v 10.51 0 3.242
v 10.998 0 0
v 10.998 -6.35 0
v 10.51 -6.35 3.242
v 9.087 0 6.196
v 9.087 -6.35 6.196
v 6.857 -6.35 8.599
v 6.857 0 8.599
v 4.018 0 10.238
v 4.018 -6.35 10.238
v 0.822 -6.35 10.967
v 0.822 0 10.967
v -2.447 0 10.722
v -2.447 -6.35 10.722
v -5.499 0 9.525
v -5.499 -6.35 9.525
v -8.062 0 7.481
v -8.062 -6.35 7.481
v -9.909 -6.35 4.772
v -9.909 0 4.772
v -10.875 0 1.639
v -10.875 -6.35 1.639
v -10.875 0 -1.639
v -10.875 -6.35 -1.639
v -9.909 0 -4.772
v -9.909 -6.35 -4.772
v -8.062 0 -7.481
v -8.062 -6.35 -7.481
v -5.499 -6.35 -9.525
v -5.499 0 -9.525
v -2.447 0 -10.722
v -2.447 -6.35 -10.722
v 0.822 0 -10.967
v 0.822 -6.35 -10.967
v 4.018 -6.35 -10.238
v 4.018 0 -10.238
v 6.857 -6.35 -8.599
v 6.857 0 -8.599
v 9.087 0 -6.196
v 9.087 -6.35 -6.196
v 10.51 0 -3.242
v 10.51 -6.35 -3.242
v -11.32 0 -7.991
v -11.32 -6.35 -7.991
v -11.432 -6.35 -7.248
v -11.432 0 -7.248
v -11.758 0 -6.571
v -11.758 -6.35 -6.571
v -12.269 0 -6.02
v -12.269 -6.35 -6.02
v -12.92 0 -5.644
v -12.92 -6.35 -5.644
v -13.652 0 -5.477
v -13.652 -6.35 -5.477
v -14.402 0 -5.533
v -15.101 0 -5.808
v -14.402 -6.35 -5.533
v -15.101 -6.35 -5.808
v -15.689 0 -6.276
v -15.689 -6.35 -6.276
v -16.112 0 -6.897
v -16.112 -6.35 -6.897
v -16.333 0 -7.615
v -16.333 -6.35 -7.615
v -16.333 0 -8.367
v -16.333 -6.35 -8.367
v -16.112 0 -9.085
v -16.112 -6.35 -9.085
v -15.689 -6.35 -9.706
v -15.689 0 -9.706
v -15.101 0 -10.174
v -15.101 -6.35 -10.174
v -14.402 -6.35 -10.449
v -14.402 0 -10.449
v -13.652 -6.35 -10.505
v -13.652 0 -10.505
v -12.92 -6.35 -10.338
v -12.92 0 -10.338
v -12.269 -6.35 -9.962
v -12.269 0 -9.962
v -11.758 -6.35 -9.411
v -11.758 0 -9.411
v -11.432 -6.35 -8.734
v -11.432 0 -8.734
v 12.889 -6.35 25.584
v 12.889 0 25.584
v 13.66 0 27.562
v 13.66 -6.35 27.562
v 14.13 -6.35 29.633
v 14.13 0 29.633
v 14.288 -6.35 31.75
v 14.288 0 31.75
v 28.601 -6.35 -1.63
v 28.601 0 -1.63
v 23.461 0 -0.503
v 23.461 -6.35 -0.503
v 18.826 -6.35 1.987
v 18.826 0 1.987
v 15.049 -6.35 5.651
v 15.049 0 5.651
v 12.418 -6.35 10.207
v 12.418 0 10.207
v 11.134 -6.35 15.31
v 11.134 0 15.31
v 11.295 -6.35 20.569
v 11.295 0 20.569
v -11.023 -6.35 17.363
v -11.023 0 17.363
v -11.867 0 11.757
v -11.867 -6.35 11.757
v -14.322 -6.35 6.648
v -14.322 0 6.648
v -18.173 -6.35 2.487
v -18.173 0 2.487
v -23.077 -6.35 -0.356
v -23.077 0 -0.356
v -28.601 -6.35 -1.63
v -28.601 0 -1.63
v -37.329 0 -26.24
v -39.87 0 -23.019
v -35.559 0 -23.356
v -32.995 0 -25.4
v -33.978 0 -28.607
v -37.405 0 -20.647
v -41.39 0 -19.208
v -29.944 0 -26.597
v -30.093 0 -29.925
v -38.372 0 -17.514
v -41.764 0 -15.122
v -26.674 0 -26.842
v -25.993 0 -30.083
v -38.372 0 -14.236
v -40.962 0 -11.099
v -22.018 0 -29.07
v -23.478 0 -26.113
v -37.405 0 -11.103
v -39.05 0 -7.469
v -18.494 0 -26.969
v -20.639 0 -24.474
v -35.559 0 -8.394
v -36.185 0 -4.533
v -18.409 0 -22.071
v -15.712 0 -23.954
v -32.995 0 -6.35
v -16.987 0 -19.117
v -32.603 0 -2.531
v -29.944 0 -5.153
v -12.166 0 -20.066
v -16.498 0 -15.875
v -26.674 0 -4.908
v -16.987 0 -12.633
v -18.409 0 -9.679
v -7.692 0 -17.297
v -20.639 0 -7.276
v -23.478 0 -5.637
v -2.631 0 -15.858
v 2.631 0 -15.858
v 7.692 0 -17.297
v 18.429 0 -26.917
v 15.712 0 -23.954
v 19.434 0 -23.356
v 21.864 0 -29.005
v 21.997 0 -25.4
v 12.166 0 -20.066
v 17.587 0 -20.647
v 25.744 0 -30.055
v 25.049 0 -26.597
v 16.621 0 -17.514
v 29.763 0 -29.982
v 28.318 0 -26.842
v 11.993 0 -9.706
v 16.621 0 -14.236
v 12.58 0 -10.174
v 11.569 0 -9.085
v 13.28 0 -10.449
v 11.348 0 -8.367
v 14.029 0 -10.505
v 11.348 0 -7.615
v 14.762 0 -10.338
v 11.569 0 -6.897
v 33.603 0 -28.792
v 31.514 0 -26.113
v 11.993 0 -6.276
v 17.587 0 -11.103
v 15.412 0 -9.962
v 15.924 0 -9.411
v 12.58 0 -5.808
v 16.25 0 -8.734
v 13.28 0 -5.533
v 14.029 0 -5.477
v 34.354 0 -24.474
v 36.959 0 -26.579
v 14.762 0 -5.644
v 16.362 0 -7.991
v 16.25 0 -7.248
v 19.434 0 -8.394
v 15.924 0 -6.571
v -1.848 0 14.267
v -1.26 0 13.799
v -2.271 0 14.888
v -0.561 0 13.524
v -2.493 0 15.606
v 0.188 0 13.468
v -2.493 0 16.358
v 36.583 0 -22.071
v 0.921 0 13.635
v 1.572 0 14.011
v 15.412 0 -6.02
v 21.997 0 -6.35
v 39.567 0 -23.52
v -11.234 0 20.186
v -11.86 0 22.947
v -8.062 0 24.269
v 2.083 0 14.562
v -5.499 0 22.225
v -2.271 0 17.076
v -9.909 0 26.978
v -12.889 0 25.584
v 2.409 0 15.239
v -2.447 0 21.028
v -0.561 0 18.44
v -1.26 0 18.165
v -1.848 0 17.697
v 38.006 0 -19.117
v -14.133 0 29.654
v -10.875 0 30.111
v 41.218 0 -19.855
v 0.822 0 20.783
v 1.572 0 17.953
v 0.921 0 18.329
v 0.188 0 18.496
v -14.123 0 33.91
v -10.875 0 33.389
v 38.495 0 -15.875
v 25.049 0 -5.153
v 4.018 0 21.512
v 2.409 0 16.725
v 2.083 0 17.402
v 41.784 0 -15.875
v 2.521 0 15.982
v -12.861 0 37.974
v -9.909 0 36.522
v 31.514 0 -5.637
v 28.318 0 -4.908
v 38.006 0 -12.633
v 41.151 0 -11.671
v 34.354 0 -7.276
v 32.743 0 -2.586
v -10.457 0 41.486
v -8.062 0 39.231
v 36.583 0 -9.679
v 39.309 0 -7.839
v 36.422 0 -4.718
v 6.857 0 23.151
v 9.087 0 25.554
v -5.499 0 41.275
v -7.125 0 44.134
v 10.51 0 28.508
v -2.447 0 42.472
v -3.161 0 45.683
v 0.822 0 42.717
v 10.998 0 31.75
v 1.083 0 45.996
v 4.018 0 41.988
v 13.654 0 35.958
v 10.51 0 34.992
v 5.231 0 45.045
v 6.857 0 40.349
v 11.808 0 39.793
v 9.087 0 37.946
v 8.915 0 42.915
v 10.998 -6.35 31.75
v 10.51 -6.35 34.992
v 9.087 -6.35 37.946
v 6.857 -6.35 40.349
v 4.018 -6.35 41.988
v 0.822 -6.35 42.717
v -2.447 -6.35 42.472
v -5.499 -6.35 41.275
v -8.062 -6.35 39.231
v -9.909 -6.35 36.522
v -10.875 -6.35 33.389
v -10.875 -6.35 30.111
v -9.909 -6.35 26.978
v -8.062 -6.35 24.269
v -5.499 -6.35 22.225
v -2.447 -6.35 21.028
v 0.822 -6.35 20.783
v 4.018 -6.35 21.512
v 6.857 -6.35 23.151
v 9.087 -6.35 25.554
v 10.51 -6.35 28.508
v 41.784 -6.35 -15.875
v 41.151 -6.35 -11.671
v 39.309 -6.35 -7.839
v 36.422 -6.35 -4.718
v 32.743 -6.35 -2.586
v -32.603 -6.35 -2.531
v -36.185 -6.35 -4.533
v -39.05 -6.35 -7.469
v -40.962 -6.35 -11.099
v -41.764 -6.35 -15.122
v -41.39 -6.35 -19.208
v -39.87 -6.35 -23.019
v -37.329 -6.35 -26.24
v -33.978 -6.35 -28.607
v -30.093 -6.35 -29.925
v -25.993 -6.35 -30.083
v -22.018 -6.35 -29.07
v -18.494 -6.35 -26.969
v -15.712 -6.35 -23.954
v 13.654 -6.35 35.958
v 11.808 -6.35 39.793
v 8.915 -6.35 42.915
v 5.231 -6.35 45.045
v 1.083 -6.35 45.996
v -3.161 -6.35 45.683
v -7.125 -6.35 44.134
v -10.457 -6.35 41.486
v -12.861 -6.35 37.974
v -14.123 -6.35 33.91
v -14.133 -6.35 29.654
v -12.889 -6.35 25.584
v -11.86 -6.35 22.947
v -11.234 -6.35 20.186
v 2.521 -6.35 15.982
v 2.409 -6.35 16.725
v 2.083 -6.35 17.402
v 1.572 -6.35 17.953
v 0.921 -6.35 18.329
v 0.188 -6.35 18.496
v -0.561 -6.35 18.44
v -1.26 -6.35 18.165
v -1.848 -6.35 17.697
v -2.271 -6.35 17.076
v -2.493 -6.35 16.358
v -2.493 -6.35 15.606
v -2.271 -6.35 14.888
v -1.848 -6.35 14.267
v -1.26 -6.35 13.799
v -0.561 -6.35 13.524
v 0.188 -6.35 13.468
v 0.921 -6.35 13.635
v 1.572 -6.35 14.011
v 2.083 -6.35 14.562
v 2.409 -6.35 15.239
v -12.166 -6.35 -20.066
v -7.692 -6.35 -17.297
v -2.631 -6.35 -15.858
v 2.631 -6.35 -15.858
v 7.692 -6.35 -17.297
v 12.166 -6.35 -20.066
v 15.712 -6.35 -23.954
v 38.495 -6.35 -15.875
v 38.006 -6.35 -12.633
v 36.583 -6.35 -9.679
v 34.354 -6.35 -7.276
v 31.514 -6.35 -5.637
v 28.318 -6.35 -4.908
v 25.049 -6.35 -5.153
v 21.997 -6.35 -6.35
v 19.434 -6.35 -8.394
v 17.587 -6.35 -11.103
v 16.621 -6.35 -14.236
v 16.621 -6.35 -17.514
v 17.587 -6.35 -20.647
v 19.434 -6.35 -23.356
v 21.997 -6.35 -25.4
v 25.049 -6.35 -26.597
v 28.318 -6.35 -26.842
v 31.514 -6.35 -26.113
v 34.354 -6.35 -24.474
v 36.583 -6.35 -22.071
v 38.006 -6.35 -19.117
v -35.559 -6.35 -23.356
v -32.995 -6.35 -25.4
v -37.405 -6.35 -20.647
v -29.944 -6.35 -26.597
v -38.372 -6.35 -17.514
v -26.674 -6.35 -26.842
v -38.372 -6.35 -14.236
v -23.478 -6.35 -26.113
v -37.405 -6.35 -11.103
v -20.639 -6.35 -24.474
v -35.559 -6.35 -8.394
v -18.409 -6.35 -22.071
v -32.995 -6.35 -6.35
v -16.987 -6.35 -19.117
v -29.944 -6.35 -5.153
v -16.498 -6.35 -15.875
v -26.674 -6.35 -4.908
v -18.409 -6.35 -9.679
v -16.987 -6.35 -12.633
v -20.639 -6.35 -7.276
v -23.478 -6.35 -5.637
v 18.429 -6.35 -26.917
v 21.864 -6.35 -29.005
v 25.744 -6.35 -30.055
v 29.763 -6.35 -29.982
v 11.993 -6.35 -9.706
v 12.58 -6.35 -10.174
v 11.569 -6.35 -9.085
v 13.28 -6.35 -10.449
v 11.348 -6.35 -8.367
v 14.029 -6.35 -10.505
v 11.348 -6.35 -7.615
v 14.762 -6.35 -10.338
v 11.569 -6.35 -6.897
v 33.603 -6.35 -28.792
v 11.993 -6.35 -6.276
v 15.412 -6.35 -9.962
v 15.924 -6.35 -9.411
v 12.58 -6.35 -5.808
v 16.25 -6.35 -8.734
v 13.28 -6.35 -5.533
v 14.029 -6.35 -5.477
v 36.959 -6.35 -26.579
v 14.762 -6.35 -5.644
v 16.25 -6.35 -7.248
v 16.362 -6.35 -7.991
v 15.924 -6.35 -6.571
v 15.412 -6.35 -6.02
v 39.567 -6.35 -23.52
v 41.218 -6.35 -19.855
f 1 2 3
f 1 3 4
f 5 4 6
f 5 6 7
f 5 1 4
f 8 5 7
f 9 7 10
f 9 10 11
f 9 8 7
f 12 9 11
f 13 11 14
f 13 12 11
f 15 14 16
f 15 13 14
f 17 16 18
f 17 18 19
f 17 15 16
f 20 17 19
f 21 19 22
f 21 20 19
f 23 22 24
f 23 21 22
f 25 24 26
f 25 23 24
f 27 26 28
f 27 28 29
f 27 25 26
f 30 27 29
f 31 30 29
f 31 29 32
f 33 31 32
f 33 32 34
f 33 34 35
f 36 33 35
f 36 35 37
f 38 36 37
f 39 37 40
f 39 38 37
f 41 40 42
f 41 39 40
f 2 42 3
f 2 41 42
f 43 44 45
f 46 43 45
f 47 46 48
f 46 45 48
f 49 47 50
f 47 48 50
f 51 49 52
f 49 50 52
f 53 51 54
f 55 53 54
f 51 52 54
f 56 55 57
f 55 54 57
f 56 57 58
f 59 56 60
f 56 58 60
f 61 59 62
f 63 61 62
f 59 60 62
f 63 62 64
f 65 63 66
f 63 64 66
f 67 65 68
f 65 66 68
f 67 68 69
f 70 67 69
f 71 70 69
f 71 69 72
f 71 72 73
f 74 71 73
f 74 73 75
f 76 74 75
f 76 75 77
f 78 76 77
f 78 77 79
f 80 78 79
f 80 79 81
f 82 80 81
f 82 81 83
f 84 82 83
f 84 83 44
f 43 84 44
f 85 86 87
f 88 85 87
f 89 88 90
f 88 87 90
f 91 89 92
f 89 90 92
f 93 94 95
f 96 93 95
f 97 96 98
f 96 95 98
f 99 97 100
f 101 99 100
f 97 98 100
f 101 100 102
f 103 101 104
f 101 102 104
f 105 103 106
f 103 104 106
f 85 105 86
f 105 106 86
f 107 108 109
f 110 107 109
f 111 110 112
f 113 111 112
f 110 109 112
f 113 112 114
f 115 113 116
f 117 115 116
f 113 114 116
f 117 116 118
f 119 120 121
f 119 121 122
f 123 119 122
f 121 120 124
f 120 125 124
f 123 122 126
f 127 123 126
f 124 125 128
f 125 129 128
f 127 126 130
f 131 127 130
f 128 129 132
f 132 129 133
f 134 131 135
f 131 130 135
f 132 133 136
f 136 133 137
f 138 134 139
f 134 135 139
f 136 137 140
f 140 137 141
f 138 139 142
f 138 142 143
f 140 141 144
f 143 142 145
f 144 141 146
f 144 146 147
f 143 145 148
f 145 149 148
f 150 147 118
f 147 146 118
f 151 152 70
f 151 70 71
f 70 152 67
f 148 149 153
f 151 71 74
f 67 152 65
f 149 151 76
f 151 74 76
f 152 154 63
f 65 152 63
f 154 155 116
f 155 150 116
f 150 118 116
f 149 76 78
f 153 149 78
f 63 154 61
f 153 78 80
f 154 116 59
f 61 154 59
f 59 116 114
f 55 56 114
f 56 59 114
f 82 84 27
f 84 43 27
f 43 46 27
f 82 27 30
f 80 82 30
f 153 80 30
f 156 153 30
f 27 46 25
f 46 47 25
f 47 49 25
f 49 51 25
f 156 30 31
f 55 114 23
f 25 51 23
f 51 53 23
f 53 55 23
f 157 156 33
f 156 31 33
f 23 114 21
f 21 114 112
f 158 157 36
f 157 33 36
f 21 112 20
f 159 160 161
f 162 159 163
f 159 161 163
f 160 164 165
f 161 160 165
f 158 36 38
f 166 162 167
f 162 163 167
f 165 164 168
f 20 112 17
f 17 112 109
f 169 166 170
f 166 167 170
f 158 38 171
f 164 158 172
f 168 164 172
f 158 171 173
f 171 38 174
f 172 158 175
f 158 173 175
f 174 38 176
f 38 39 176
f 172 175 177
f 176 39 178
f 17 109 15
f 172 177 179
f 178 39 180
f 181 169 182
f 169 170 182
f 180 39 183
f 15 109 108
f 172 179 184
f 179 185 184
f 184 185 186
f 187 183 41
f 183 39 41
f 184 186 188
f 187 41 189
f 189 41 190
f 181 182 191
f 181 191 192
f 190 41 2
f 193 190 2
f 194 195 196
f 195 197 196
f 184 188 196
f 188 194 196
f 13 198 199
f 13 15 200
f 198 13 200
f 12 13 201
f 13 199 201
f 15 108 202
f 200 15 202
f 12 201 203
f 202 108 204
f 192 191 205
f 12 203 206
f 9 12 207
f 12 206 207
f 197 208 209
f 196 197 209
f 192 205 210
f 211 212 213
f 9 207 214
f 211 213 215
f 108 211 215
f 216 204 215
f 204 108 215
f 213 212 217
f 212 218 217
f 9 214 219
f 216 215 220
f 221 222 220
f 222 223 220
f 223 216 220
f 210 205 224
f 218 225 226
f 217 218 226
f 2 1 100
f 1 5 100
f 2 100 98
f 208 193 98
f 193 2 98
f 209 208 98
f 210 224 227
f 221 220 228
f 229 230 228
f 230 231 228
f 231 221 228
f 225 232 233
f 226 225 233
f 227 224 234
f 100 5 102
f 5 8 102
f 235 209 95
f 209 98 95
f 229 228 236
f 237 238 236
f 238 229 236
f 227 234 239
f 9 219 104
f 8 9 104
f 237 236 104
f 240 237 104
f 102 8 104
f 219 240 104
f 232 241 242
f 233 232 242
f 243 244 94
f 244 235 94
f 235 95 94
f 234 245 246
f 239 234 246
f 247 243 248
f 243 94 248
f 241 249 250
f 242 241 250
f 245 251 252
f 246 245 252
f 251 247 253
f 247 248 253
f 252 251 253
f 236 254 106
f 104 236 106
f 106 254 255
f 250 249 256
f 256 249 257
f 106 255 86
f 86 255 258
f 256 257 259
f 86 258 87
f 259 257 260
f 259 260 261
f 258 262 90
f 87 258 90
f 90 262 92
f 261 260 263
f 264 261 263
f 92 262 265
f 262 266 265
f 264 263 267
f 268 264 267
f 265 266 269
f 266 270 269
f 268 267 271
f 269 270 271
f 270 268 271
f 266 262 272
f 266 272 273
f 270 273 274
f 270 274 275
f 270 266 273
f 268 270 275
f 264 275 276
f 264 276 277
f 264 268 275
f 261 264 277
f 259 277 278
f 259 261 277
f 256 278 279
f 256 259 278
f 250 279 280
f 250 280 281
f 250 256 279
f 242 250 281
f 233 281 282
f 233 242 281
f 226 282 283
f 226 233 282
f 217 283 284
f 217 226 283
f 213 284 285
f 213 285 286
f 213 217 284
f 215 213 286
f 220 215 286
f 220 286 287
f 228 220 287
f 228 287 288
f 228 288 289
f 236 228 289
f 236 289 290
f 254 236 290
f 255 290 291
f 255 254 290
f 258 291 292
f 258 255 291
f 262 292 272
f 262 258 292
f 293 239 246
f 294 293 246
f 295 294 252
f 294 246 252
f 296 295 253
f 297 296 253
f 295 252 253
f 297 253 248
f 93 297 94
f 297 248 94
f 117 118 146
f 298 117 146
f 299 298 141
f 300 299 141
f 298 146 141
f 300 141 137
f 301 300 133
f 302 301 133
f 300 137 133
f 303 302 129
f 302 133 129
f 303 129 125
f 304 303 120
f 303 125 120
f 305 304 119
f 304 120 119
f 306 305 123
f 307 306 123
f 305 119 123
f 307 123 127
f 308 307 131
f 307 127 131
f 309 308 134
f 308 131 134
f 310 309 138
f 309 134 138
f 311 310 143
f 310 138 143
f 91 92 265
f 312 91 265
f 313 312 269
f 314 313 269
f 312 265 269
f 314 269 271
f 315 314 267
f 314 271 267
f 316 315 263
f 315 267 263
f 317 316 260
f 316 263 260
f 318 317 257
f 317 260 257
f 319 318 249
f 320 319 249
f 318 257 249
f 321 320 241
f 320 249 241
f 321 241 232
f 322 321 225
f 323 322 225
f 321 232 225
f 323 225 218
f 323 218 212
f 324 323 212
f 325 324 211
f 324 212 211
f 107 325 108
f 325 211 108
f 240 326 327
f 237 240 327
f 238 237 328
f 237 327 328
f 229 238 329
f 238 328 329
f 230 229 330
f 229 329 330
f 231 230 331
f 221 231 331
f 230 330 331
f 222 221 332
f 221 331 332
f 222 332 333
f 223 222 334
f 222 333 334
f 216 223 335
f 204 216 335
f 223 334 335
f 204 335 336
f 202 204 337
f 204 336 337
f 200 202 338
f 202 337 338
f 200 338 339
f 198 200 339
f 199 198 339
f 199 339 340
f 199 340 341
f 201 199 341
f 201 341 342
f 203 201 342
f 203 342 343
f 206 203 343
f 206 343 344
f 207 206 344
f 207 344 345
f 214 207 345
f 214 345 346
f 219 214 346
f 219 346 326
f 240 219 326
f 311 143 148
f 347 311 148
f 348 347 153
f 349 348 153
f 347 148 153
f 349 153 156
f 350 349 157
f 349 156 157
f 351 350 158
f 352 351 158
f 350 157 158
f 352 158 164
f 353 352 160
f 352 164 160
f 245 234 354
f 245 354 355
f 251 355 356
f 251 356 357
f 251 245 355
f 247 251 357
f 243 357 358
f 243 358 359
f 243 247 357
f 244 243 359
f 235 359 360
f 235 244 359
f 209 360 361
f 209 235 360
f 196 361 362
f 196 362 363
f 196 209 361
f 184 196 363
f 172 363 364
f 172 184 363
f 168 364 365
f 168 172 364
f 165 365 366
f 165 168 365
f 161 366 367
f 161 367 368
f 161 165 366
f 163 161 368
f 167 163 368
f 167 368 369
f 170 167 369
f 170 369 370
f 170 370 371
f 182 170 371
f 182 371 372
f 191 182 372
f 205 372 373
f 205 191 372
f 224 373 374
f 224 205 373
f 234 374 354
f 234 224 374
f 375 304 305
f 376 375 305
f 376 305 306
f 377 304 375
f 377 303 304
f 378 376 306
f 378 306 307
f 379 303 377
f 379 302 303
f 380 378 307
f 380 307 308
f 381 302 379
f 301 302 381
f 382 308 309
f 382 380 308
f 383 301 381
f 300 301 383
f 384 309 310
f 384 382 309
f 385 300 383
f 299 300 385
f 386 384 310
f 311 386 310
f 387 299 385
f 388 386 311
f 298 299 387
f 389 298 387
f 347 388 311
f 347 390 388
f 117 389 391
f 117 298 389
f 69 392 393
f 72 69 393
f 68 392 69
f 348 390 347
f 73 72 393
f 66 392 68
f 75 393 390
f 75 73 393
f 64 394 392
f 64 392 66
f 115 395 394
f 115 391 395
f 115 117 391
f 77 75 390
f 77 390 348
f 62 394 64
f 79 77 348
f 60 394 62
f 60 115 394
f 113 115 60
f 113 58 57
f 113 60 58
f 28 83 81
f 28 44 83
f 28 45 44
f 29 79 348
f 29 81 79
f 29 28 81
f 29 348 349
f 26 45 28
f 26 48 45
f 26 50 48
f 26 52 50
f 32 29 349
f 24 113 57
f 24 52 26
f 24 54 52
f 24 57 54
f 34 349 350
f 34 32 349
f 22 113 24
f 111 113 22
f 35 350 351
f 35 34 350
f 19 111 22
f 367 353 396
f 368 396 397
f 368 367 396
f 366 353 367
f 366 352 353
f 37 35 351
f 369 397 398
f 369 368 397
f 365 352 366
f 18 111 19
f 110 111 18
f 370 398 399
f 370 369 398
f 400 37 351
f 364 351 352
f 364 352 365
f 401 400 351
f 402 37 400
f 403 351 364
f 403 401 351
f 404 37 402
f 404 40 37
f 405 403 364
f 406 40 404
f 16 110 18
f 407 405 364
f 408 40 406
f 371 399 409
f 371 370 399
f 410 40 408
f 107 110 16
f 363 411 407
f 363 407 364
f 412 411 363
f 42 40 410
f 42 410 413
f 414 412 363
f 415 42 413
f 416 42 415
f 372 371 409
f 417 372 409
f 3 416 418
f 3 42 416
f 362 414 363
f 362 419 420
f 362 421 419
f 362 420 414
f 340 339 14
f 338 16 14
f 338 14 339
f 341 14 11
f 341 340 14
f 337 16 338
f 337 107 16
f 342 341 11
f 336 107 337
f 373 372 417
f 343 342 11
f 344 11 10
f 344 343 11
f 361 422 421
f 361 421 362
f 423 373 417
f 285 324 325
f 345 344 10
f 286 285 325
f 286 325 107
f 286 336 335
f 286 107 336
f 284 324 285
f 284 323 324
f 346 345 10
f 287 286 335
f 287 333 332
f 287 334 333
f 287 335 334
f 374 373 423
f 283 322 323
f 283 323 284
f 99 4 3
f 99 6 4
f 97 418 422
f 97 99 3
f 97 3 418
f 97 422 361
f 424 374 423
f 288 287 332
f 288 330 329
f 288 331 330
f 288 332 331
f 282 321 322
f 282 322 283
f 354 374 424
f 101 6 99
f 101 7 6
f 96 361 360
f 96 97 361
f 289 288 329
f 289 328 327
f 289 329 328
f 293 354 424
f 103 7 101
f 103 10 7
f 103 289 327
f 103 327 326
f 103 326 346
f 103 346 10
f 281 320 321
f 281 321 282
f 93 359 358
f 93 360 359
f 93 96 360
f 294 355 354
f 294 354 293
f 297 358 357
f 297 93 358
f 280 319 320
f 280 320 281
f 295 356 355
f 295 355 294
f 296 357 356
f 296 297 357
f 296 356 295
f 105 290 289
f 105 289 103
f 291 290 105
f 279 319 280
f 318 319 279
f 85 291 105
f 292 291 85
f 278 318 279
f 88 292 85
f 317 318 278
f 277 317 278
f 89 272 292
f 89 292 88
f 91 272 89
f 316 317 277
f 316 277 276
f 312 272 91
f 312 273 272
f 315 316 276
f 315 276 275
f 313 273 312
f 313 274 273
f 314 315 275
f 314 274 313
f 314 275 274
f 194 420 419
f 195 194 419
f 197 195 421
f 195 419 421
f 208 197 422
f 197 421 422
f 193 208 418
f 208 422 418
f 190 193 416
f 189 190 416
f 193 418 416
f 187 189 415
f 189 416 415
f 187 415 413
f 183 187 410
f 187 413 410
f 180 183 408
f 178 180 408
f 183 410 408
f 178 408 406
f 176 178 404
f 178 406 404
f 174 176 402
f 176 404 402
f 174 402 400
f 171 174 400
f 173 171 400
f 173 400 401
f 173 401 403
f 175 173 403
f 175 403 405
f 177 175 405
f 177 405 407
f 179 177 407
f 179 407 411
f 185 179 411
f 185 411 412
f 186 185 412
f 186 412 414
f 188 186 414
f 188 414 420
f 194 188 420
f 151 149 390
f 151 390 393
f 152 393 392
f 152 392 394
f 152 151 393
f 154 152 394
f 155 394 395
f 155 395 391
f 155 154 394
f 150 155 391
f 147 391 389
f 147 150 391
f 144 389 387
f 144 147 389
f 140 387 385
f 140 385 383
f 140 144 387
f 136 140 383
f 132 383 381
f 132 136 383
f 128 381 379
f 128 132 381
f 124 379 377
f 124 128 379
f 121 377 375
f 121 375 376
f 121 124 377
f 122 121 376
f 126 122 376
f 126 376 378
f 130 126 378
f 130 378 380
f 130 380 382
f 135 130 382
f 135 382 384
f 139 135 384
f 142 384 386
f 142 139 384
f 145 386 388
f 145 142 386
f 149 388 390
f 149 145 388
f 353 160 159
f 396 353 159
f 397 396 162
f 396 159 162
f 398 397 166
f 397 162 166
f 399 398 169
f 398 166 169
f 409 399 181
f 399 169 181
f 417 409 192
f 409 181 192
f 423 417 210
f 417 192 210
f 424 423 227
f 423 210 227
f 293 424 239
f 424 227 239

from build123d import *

# Parameters (mm, degrees)
F1_R     = 10.9982
F1_R_2   = 14.2875
F2_DEPTH = 6.35
F0_R     = 14.2875
F0_R_2   = 10.9982
F3_DEPTH = 6.35
F4_R     = 2.520905
F5_DEPTH = 6.351


with BuildPart() as f2:
    # F1 (on Front) → F2 (new body)
    with BuildSketch(Plane.XZ):
        with BuildLine():
            ThreePointArc((14.2875, 31.75), (-3.161339, 45.683363), (-12.888506, 25.58404))
            ThreePointArc((-12.888506, 25.58404), (0, 17.4625), (12.888506, 25.58404))
            ThreePointArc((12.888506, 25.58404), (13.933363, 28.588661), (14.2875, 31.75))
        make_face()
        with Locations((0, 31.75)):
            Circle(F1_R, mode=Mode.SUBTRACT)
        with BuildLine():
            ThreePointArc((41.783807, -15.875), (37.982283, -6.170519), (28.600682, -1.630246))
            ThreePointArc((28.600682, -1.630246), (15.122969, -8.73125), (15.712175, -23.953793))
            ThreePointArc((15.712175, -23.953793), (31.725188, -29.522315), (41.783807, -15.875))
        make_face()
        with Locations((27.496307, -15.875)):
            Circle(F1_R, mode=Mode.SUBTRACT)
        with BuildLine():
            ThreePointArc((-13.208807, -15.875), (-17.791826, -5.389023), (-28.600681, -1.630246))
            ThreePointArc((-28.600681, -1.630246), (-39.869645, -23.01875), (-15.712175, -23.953793))
            ThreePointArc((-15.712175, -23.953793), (-13.848991, -20.103882), (-13.208807, -15.875))
        make_face()
        with Locations((-27.496307, -15.875)):
            Circle(F1_R, mode=Mode.SUBTRACT)
        with BuildLine():
            ThreePointArc((-12.888506, 25.58404), (-11.495364, 21.577878), (-11.023181, 17.362759))
            ThreePointArc((-11.023181, 17.362759), (-16.091879, 4.423451), (-28.600681, -1.630246))
            ThreePointArc((-28.600681, -1.630246), (-17.791826, -5.389023), (-13.208807, -15.875))
            ThreePointArc((-13.208807, -15.875), (-13.848991, -20.103882), (-15.712175, -23.953793))
            ThreePointArc((-15.712175, -23.953793), (0, -15.675518), (15.712175, -23.953793))
            ThreePointArc((15.712175, -23.953793), (15.122969, -8.73125), (28.600682, -1.630246))
            ThreePointArc((28.600682, -1.630246), (13.575397, 7.837759), (12.888506, 25.58404))
            ThreePointArc((12.888506, 25.58404), (0, 17.4625), (-12.888506, 25.58404))
        make_face()
        Circle(F1_R_2, mode=Mode.SUBTRACT)
    extrude(amount=F2_DEPTH)

    # F0 (on Front) → F3 (join)
    with BuildSketch(Plane.XZ):
        Circle(F0_R)
        Circle(F0_R_2, mode=Mode.SUBTRACT)
    extrude(amount=F3_DEPTH)

    # F4 (on face) → F5 (cut, through all)
    with BuildSketch(Plane.XZ.offset(6.35)):
        with Locations((0, 15.981898)):
            Circle(F4_R)
        with Locations((-13.840729, -7.990949)):
            Circle(F4_R)
        with Locations((13.840729, -7.990949)):
            Circle(F4_R)
    extrude(amount=-F5_DEPTH, mode=Mode.SUBTRACT)


solid = f2.part
